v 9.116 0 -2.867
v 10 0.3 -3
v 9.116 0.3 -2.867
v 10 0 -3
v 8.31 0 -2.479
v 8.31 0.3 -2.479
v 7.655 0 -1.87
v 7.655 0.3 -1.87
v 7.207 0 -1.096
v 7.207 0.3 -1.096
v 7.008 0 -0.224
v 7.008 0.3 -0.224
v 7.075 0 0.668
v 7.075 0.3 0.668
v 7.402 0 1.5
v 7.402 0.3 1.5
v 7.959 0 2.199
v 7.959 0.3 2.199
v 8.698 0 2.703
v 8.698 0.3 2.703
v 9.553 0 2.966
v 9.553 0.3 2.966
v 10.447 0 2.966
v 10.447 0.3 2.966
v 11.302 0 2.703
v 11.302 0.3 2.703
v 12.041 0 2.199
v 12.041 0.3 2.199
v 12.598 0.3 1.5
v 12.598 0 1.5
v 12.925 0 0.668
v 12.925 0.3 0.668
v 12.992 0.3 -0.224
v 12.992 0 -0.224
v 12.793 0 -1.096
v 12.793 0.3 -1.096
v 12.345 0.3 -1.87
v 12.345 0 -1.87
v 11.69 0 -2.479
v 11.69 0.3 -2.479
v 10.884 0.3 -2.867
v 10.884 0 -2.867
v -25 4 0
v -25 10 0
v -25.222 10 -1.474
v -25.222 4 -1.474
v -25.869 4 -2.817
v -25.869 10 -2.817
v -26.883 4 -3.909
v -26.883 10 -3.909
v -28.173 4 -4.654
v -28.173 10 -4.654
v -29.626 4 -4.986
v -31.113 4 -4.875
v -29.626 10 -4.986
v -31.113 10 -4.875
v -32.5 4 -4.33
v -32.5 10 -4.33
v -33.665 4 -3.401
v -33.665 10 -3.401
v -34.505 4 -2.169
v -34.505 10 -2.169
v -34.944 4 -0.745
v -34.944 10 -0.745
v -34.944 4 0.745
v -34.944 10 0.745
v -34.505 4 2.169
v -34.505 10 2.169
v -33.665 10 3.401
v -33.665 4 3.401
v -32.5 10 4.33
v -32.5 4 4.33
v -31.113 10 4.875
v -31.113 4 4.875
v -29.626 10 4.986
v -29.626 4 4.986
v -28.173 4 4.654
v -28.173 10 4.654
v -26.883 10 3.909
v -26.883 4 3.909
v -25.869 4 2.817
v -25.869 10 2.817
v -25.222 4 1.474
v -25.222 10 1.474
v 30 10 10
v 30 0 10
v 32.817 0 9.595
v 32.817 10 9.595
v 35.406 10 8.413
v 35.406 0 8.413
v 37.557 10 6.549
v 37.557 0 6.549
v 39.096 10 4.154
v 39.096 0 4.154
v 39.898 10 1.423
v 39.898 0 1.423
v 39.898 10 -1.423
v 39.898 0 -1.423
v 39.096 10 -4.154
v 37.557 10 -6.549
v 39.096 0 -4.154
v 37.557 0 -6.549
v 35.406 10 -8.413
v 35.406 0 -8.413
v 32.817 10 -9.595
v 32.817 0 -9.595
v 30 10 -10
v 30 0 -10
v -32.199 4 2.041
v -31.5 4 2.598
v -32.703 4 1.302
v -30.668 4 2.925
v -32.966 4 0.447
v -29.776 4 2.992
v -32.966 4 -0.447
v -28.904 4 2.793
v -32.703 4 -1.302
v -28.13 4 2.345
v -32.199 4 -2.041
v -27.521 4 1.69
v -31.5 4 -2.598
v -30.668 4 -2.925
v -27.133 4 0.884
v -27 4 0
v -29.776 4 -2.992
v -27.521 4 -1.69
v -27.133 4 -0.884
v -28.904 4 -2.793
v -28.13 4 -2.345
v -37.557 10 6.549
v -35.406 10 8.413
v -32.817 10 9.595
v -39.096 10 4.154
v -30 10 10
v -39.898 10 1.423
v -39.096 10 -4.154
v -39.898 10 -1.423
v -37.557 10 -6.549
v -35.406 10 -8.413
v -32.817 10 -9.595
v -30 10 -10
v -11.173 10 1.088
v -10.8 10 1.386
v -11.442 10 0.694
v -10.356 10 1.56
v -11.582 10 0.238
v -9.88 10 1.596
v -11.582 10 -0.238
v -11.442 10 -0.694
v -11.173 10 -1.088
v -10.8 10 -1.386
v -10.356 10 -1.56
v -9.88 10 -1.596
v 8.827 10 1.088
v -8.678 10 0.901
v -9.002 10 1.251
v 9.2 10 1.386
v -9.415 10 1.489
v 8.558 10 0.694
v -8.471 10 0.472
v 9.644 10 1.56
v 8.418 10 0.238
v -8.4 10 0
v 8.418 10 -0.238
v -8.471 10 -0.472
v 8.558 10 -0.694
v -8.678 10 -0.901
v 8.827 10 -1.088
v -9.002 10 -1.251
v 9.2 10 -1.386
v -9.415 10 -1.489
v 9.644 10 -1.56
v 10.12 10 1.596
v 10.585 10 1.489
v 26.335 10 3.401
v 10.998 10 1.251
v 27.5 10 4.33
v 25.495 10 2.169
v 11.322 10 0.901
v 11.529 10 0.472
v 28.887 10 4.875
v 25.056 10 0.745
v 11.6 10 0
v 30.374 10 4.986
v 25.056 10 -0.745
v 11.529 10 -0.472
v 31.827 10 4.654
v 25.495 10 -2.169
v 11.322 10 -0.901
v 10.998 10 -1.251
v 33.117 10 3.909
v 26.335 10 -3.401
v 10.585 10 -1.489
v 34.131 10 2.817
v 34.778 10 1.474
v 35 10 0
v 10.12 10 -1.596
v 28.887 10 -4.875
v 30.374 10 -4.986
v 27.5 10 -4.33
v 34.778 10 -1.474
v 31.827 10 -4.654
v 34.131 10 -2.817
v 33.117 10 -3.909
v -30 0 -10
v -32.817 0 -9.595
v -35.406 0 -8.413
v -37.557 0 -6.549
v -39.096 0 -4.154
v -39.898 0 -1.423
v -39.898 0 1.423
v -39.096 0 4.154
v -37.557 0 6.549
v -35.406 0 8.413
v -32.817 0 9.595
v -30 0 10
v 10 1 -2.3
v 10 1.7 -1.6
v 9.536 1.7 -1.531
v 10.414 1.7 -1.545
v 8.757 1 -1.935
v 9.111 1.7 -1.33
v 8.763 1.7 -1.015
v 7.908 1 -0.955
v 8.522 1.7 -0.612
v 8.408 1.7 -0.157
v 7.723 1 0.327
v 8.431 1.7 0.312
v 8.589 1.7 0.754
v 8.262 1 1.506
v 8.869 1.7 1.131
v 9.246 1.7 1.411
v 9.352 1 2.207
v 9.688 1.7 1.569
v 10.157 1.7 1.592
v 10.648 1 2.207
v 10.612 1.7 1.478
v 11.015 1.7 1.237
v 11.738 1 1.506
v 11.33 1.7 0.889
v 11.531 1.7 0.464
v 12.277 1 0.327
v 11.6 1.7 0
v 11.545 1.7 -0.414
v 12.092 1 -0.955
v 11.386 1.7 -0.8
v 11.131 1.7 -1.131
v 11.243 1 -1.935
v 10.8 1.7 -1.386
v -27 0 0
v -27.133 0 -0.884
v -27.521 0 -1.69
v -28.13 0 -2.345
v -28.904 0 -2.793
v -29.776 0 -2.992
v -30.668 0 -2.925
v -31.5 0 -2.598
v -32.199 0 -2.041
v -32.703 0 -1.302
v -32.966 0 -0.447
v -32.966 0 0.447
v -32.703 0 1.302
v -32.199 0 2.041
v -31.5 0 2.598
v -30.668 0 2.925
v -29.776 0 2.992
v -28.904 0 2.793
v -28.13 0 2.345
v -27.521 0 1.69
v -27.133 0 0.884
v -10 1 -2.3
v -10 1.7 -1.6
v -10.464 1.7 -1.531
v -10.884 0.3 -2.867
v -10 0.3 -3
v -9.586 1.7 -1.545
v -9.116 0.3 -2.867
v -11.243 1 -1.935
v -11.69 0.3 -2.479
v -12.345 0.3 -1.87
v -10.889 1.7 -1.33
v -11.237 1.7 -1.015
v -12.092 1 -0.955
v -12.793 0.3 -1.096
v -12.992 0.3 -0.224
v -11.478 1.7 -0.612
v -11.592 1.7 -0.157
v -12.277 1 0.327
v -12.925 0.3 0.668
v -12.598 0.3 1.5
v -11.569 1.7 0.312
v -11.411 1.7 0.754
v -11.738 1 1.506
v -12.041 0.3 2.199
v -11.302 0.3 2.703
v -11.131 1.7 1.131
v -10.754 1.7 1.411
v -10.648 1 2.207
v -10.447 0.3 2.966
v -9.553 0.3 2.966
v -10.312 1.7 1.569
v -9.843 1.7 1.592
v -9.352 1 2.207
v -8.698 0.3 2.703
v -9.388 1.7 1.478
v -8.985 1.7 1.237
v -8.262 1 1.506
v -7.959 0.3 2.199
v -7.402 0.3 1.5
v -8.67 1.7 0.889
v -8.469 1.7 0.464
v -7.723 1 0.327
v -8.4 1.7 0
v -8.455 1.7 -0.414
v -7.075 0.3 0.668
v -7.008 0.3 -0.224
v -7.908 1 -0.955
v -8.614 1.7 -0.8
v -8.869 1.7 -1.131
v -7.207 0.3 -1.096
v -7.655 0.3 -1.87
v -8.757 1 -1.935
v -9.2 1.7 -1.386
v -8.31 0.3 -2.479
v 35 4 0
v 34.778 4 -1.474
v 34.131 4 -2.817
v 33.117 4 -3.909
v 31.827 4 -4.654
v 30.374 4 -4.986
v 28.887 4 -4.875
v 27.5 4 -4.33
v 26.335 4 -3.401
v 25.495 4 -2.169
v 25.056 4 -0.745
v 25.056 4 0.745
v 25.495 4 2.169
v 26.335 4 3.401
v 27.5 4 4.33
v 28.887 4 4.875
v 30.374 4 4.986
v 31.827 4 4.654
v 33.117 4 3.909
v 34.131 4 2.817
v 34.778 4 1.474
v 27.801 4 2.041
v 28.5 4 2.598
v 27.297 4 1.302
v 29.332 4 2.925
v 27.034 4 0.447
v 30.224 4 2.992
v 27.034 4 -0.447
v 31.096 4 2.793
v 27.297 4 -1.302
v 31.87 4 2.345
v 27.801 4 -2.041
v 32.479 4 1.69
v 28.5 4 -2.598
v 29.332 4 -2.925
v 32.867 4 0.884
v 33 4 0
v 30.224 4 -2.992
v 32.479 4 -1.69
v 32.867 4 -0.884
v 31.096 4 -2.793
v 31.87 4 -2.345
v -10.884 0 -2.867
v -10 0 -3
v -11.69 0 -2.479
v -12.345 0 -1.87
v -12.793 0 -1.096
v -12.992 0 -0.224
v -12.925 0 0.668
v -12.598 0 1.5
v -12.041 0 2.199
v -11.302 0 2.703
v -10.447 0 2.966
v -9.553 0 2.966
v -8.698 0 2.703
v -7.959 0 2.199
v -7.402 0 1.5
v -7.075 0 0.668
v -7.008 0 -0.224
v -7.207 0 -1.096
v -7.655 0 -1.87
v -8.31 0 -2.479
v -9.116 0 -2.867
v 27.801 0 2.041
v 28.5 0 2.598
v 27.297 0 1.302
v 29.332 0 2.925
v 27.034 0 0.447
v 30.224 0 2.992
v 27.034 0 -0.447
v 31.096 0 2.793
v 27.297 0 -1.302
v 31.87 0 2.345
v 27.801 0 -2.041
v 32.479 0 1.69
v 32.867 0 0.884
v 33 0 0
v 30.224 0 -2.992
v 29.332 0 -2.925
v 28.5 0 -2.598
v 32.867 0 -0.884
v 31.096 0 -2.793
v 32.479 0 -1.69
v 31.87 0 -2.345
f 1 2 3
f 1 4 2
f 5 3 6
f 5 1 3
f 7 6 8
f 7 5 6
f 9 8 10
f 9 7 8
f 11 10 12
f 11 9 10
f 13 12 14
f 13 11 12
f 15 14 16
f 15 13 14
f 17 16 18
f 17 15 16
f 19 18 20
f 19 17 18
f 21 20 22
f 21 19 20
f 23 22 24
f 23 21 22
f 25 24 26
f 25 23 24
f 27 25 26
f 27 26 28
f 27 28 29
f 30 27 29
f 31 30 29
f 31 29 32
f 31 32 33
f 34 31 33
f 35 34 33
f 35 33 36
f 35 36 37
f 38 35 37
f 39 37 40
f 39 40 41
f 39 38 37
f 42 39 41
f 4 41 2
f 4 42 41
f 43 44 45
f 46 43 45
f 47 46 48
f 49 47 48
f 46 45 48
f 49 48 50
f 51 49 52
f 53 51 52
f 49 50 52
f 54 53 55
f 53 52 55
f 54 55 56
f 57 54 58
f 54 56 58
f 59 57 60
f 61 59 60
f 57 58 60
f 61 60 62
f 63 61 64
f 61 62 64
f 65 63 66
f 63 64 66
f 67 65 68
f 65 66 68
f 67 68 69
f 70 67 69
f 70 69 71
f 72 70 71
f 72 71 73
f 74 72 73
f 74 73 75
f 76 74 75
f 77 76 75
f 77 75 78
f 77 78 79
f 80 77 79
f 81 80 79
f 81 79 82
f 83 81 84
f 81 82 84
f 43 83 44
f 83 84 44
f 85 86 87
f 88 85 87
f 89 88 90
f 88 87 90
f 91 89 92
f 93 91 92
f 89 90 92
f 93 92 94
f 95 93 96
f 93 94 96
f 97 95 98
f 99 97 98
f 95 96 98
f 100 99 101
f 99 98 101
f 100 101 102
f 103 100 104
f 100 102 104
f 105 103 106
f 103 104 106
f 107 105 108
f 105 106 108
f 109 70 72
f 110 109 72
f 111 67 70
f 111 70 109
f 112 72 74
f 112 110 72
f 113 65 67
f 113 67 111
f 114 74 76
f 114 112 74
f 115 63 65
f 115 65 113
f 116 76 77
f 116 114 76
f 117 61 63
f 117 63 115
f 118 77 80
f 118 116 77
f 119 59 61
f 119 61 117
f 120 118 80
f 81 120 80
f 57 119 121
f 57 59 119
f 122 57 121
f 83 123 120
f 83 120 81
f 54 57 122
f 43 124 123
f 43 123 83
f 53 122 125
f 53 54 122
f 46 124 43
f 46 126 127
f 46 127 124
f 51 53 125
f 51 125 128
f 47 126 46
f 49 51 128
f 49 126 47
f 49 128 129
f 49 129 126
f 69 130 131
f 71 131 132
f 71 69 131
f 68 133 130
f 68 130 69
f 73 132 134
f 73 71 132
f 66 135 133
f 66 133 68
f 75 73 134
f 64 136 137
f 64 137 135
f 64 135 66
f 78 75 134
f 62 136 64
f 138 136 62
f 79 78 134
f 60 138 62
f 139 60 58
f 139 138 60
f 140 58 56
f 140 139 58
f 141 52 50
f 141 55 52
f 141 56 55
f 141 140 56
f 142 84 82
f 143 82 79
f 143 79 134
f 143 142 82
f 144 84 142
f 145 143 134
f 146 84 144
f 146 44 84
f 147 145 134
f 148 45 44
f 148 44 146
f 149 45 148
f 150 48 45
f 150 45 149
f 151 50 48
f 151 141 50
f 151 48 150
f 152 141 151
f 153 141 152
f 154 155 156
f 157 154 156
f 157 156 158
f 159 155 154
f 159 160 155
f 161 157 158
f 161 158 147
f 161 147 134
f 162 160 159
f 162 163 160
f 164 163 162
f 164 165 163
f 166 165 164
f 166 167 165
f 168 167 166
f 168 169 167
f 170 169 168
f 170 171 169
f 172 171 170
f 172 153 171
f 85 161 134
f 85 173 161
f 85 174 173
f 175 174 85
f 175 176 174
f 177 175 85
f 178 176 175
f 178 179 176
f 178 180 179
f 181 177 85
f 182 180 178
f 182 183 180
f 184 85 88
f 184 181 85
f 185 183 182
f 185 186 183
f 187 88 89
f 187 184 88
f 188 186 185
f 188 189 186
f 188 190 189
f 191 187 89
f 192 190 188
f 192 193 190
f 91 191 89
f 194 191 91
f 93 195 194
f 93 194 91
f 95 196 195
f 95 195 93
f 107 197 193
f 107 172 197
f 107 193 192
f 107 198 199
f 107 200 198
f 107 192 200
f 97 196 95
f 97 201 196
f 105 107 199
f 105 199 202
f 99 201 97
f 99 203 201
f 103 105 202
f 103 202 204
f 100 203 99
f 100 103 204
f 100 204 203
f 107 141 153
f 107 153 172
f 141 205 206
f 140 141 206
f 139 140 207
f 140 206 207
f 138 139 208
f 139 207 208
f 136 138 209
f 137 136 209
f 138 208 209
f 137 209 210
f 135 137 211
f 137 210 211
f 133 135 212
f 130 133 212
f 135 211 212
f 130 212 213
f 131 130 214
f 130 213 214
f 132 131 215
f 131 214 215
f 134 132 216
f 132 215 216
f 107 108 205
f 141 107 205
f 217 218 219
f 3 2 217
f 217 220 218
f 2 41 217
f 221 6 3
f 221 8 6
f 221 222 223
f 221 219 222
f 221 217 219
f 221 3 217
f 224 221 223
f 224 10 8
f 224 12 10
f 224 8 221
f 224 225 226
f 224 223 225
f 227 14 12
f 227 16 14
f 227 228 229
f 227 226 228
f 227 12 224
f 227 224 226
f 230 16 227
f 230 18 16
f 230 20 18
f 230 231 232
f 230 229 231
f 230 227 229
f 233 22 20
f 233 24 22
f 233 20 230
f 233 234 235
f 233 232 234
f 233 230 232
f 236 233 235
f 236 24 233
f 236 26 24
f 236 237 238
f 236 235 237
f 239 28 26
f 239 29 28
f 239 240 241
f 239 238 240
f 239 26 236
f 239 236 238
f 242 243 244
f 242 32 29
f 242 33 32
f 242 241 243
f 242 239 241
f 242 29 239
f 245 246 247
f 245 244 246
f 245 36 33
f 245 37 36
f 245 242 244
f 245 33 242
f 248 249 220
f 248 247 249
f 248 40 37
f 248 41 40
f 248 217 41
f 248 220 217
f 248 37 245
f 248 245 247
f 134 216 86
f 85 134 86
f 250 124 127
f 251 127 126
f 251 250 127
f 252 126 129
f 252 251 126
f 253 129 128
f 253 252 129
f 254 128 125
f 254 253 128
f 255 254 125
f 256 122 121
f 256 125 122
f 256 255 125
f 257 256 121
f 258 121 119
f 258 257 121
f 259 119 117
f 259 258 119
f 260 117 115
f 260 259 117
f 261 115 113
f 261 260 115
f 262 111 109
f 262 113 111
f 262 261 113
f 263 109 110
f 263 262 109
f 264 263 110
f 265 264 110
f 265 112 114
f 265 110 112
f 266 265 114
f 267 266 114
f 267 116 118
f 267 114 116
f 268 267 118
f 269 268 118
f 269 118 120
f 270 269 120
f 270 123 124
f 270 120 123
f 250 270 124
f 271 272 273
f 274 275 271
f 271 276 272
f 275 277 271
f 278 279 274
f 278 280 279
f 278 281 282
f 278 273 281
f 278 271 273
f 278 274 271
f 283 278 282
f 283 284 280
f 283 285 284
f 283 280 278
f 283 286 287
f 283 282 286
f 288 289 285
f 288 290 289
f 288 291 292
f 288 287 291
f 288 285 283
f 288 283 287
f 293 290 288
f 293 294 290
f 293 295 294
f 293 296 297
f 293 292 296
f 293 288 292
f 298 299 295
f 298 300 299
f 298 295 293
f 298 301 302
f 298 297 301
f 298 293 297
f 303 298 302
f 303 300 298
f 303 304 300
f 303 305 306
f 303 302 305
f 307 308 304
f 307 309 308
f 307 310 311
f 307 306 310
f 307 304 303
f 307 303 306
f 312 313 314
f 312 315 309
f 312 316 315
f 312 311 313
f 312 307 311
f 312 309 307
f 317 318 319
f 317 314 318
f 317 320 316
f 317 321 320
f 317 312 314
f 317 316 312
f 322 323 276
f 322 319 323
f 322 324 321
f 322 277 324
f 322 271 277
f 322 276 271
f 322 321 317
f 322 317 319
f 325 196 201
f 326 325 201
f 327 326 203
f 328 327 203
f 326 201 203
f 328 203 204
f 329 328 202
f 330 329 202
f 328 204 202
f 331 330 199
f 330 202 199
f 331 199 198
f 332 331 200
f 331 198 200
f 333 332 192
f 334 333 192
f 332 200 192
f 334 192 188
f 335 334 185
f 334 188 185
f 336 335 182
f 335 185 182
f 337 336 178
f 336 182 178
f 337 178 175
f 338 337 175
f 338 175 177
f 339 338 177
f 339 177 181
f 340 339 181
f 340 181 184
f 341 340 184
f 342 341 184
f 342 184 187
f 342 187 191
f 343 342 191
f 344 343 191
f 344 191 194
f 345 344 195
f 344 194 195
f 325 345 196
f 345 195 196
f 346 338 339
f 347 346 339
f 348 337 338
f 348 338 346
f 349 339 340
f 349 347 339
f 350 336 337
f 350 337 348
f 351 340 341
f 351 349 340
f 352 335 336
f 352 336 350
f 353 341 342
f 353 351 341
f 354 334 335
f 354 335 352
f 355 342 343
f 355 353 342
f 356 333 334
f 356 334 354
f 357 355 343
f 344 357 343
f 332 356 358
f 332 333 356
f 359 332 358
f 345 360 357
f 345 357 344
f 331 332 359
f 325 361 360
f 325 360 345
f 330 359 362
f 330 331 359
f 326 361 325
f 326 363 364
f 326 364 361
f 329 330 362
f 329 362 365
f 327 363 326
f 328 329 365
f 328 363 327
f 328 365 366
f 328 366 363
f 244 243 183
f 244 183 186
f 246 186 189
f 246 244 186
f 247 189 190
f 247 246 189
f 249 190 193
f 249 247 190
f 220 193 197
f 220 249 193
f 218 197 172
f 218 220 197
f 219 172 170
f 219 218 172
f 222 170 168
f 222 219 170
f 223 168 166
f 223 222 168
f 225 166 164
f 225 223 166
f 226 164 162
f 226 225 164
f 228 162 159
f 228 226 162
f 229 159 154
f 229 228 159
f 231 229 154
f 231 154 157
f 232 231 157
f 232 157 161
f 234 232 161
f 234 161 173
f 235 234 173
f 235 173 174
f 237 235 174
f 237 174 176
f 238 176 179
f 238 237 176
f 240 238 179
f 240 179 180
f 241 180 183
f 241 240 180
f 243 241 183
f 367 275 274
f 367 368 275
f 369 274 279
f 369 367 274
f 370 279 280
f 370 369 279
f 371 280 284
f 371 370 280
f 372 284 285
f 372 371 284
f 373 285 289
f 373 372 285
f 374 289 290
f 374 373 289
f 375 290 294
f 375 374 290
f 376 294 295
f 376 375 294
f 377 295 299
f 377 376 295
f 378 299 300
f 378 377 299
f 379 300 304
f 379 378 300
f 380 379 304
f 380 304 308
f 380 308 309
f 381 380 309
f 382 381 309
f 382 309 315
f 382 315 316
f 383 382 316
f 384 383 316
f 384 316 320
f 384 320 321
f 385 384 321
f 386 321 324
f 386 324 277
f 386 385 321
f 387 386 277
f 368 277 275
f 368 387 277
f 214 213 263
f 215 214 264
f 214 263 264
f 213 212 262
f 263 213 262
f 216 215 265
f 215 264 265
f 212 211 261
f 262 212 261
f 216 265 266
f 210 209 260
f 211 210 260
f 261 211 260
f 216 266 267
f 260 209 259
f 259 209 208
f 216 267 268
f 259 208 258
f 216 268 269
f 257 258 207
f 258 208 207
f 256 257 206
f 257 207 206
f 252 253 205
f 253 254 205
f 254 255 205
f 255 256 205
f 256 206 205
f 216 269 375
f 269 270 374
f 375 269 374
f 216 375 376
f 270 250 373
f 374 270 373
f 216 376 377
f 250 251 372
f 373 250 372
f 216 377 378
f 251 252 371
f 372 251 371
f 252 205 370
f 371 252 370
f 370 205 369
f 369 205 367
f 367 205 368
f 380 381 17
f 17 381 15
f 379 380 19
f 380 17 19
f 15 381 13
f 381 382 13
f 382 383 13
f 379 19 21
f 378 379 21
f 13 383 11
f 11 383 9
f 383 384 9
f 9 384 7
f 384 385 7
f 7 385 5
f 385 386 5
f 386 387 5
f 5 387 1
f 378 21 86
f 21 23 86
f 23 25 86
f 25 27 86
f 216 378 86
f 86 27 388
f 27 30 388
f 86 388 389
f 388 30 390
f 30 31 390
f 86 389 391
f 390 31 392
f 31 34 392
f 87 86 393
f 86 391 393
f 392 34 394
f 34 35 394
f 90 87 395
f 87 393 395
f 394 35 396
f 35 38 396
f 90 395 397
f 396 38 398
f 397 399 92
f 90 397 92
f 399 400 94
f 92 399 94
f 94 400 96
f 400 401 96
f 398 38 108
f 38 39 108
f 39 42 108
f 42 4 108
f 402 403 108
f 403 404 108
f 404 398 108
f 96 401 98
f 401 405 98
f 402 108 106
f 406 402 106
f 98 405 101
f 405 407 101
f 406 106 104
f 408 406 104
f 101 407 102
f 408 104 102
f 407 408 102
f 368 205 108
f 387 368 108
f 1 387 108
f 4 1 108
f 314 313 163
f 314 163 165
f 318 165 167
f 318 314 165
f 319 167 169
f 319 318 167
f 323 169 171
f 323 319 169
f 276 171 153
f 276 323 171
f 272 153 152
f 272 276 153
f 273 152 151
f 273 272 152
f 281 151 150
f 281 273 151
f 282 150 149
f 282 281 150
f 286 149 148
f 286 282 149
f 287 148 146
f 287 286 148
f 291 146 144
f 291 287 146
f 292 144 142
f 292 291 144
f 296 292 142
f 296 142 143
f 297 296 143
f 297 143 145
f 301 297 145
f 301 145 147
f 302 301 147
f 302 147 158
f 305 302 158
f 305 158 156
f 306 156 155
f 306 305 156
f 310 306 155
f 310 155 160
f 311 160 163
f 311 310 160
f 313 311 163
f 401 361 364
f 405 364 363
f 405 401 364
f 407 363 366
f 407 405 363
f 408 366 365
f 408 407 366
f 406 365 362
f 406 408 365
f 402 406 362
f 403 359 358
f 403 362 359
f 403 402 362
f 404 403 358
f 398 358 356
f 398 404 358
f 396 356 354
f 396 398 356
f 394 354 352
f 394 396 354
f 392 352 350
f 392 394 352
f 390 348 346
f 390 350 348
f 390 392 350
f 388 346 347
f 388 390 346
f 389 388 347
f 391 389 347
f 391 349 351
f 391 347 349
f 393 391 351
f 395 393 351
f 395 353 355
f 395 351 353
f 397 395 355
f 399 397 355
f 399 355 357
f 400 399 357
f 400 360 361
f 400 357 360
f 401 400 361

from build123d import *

# Parameters (mm, degrees)
SKETCH1_R                                      = 10
SKETCH1_R_2                                    = 3
SKETCH1_R_3                                    = 1.6
BOSS_EXTRUDE1_DEPTH                            = 10
SKETCH2_R                                      = 5
CUT_EXTRUDE1_DEPTH                             = 6
CSK_FOR_M3_FLAT_HEAD_MACHINE_SCREW1_AT_2_COUNT = 2
CSK_FOR_M3_FLAT_HEAD_MACHINE_SCREW1_AT_2_PITCH = 20


with BuildPart() as part:
    # Sketch1 → Boss-Extrude1 (new body)
    with BuildSketch(Plane(origin=(0, 0, 0), x_dir=(1, 0, 0), z_dir=(0, 1, 0))):
        with Locations((-30, 0)):
            Circle(SKETCH1_R)
        with Locations((-30, 0)):
            Circle(SKETCH1_R_2, mode=Mode.SUBTRACT)
        with BuildLine():
            Line((29.999999936, 10), (-30, 10))
            ThreePointArc((-30, 10), (-22.928932188, 7.071067812), (-20, 0))
            ThreePointArc((-20, 0), (-22.928932188, -7.071067812), (-30, -10))
            Line((-30, -10), (30, -10))
            ThreePointArc((30, -10), (20, -3.2e-08), (29.999999936, 10))
        make_face()
        with Locations((-10, 0)):
            Circle(SKETCH1_R_3, mode=Mode.SUBTRACT)
        with Locations((10, 0)):
            Circle(SKETCH1_R_3, mode=Mode.SUBTRACT)
        with Locations((30, 0)):
            Circle(SKETCH1_R)
        with Locations((30, 0)):
            Circle(SKETCH1_R_2, mode=Mode.SUBTRACT)
    extrude(amount=BOSS_EXTRUDE1_DEPTH)

    # Sketch2 → Cut-Extrude1 (cut)
    with BuildSketch(Plane(origin=(0, 10, 0), x_dir=(1, 0, 0), z_dir=(0, 1, 0))):
        with Locations((-30, 0)):
            Circle(SKETCH2_R)
        with Locations((30, 0)):
            Circle(SKETCH2_R)
    extrude(amount=-CUT_EXTRUDE1_DEPTH, mode=Mode.SUBTRACT)

    # Sketch4 → CSK for M3 Flat Head Machine Screw1 (revolve, cut)
    with BuildSketch(Plane(origin=(-10, 0, 0), x_dir=(0, 0, -1), z_dir=(1, 0, 0))):
        Polygon((0, 0), (0, 10), (1.5, 10), (1.5, 1.8), (3, 0.3), (3, 0), align=None)
    csk_for_m3_flat_head_machine_screw1 = revolve(axis=Axis((-10, -6.35, 0), (0, 1, 0)), mode=Mode.SUBTRACT)

    # CSK for M3 Flat Head Machine Screw1 at 2: CSK for M3 Flat Head Machine Screw1 ×2
    with Locations(*[(i * CSK_FOR_M3_FLAT_HEAD_MACHINE_SCREW1_AT_2_PITCH, 0, 0) for i in range(1, CSK_FOR_M3_FLAT_HEAD_MACHINE_SCREW1_AT_2_COUNT)]):
        add(csk_for_m3_flat_head_machine_screw1, mode=Mode.SUBTRACT)


solid = part.part
